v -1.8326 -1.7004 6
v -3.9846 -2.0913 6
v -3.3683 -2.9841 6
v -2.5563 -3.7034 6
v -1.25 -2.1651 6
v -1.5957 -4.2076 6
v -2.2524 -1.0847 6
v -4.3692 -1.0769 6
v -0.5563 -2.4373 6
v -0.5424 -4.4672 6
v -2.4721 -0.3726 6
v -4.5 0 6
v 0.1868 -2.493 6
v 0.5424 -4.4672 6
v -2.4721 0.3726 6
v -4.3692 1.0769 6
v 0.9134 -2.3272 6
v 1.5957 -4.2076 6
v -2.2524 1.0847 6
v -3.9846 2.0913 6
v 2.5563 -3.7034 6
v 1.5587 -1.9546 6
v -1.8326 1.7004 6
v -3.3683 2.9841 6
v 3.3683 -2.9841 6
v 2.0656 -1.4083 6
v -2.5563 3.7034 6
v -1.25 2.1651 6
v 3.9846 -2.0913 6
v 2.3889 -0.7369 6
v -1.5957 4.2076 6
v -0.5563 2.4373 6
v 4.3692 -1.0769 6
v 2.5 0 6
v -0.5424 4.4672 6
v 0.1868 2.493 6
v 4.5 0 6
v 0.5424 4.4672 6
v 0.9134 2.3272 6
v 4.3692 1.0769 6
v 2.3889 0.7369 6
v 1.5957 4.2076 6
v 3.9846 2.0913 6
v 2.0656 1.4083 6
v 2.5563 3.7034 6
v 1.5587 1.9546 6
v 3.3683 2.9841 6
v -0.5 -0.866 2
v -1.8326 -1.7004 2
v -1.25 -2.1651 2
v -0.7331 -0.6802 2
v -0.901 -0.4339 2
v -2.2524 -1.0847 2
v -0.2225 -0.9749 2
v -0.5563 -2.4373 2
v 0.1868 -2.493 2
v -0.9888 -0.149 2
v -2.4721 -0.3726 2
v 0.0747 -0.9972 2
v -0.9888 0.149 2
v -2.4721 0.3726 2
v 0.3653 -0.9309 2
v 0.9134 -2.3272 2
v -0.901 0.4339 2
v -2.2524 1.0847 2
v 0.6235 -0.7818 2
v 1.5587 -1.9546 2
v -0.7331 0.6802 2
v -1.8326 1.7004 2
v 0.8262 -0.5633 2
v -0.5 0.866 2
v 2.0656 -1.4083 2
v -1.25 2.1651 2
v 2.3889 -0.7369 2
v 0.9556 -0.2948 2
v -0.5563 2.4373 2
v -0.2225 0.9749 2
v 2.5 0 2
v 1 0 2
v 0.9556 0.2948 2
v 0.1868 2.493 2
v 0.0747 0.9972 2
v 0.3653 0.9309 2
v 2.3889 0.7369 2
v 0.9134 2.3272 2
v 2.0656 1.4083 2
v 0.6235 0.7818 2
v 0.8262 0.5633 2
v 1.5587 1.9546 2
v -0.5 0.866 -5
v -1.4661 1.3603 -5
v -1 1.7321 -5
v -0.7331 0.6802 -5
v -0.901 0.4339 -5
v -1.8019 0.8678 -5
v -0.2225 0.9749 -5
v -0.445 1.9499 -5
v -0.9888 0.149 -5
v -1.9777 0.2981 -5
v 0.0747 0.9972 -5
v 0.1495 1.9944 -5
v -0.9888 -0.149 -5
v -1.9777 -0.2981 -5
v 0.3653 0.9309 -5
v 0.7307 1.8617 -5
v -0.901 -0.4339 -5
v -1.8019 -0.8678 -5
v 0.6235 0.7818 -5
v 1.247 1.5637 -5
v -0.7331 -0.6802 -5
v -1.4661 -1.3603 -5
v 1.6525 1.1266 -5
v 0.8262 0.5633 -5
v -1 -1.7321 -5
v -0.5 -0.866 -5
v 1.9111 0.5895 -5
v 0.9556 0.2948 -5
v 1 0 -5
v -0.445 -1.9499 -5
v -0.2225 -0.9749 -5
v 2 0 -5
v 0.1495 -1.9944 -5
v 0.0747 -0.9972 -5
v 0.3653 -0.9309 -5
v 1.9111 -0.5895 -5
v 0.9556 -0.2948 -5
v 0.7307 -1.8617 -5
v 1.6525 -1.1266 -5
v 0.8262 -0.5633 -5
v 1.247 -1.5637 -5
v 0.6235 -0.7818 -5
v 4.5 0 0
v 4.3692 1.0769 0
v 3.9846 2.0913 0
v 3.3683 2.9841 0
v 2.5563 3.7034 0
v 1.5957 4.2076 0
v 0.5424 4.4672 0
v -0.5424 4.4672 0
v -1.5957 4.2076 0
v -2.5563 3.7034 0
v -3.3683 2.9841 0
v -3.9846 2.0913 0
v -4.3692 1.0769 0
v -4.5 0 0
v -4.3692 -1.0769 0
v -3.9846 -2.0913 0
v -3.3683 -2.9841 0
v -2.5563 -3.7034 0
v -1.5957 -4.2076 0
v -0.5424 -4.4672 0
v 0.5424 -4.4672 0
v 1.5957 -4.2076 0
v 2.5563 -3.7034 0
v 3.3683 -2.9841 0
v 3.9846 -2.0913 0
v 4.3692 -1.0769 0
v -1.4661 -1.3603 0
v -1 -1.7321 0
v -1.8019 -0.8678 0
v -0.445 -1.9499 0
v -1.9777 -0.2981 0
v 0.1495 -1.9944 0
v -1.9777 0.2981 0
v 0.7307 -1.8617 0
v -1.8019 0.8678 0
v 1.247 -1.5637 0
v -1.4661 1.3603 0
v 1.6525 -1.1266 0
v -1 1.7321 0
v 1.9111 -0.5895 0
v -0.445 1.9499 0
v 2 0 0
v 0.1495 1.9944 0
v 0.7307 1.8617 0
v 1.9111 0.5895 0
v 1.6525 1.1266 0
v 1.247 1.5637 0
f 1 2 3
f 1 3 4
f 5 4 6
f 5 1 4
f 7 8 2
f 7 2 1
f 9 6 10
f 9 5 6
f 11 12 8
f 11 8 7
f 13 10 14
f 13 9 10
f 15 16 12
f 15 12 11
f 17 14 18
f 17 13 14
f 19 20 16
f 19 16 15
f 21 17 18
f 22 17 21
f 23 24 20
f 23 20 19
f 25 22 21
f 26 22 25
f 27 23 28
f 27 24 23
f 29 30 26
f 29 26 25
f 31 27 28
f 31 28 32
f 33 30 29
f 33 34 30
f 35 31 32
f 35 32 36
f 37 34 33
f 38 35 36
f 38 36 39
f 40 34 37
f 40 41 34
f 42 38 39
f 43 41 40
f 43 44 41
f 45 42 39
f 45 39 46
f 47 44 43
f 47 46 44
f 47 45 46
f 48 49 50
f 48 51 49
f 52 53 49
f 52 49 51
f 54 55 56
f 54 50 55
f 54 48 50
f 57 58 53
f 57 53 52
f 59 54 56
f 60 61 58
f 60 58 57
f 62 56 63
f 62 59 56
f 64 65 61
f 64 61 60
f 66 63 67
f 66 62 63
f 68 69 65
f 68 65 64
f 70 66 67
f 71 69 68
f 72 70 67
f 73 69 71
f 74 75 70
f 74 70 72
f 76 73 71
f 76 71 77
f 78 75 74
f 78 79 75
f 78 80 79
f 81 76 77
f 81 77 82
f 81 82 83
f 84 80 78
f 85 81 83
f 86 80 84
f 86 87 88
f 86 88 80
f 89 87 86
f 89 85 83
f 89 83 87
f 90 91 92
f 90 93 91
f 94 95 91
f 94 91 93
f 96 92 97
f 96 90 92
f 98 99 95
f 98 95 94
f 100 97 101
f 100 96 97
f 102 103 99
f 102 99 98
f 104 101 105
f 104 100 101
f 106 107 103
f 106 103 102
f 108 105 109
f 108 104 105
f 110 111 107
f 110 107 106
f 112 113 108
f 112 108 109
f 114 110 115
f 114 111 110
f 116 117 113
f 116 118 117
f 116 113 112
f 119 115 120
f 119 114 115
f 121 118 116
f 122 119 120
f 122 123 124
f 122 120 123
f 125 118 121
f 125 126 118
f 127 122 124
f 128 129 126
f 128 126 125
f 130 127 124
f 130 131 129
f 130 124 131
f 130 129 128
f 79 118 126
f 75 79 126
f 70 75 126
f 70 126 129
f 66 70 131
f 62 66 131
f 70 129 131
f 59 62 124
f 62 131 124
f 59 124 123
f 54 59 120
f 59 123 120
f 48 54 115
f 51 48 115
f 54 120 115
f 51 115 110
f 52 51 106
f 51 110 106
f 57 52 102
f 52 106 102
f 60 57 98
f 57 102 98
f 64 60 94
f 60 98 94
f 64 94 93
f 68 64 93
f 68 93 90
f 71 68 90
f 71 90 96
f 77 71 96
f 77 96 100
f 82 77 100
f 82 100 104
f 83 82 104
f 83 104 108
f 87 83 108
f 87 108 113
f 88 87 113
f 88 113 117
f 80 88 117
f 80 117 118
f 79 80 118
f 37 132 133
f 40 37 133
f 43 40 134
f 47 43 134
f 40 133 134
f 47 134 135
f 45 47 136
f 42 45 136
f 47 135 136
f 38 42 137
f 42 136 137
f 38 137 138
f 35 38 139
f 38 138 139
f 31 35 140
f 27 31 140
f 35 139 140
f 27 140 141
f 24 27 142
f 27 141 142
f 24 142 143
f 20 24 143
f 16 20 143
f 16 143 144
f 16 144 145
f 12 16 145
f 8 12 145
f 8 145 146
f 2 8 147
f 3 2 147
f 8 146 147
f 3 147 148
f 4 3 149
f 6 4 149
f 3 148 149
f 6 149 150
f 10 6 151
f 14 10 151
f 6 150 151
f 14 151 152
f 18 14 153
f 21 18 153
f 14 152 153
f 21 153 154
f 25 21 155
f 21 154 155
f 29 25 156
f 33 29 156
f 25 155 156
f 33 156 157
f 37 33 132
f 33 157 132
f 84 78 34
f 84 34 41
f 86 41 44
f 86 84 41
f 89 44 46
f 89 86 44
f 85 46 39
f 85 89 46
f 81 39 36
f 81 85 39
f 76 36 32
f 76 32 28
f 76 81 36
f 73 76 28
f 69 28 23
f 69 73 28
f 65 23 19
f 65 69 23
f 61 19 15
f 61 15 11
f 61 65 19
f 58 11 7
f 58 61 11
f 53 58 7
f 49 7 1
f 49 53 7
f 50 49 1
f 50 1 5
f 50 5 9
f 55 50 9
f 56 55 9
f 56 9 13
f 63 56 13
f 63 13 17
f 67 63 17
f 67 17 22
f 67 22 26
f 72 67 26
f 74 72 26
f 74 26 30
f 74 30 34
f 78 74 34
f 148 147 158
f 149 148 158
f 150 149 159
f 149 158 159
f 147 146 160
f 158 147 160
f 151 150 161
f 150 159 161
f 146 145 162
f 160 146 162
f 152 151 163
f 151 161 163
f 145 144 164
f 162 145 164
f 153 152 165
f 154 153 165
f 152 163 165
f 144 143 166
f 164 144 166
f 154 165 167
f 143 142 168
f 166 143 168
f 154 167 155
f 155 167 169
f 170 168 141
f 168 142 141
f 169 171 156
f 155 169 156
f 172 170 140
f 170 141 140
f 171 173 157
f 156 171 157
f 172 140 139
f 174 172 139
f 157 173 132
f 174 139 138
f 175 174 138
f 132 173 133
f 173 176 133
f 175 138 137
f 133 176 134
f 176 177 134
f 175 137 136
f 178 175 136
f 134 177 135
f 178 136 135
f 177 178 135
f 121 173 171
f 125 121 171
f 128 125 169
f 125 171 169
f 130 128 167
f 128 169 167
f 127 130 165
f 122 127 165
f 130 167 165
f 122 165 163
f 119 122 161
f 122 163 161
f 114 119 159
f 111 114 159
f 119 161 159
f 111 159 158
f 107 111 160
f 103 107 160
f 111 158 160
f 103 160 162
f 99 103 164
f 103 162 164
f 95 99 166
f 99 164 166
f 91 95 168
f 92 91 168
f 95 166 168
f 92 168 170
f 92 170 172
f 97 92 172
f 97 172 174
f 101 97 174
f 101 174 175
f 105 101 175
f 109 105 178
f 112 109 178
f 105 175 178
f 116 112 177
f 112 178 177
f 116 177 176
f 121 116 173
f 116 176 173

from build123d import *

# Parameters (mm, degrees)
F0_R     = 4.5
F1_DEPTH = 6
F2_T     = -2
F3_R     = 2
F4_DEPTH = 5
F5_T     = 1
F6_R     = 1
F7_DEPTH = 12.5


# Not quite as in the source:
# - a shell that OpenCascade refuses in one call is made with other operations: the cavity is built on its own and cut out


with BuildPart() as f1:
    # F0 (on Top) → F1 (new body)
    with BuildSketch(Plane.XY):
        Circle(F0_R)
    extrude(amount=F1_DEPTH)

    # F2
    f2_openings = [f1.faces().sort_by_distance(p)[0] for p in [
        (0, 0, 6),
    ]]
    offset(amount=F2_T, openings=f2_openings)

    # F3 (on face) → F4 (join)
    with BuildSketch(Plane(origin=(0, 0, 0), x_dir=(1, 0, 0), z_dir=(0, 0, -1))):
        Circle(F3_R)
    extrude(amount=F4_DEPTH)

    # F5: shell of thickness 1, made by hand


with BuildPart() as f5_core1:
    # F5_t2: copy of F1
    add(f1.part)

    # the walls: a layer under each face that stays
    f5_faces = [f5_core1.faces().sort_by_distance(p)[0] for p in [
        (-4.5, 0, 3),
        (-3, -3, 0),
        (-3, -3, 6),
        (-2, 0, -2.5),
        (-2.5, 0, 4),
        (0, 0, 2),
    ]]
    thicken(f5_faces, amount=-F5_T, mode=Mode.SUBTRACT)

    # F5_s3 → F5_t4 (revolve, cut)
    with BuildSketch(Plane.XZ):
        Polygon((2.01, -0.01), (2, 1), (1, 1), (1, 0), align=None)
    revolve(axis=Axis((0, 0, 0), (0, 0, -1)), mode=Mode.SUBTRACT)

    # F5_s5 → F5_t6 (revolve, cut)
    with BuildSketch(Plane.XZ):
        Polygon((2.49, 2.01), (3.5, 2), (3.5, 1), (2.5, 1), align=None)
    revolve(axis=Axis((0, 0, 2), (0, 0, -1)), mode=Mode.SUBTRACT)


with BuildPart() as f1_1:
    add(f1.part)

    # what is left inside the walls is the cavity
    f5_cavity = [f5_core1.part.solids().sort_by_distance(p)[0] for p in [
        (-0.99, 0, -1),
    ]]
    add(f5_cavity, mode=Mode.SUBTRACT)

    # F6 (on face) → F7 (cut, symmetric)
    with BuildSketch(Plane(origin=(0, 0, 0), x_dir=(1, 0, 0), z_dir=(0, 0, -1))):
        Circle(F6_R)
    extrude(amount=F7_DEPTH, both=True, mode=Mode.SUBTRACT)


solid = f1_1.part
